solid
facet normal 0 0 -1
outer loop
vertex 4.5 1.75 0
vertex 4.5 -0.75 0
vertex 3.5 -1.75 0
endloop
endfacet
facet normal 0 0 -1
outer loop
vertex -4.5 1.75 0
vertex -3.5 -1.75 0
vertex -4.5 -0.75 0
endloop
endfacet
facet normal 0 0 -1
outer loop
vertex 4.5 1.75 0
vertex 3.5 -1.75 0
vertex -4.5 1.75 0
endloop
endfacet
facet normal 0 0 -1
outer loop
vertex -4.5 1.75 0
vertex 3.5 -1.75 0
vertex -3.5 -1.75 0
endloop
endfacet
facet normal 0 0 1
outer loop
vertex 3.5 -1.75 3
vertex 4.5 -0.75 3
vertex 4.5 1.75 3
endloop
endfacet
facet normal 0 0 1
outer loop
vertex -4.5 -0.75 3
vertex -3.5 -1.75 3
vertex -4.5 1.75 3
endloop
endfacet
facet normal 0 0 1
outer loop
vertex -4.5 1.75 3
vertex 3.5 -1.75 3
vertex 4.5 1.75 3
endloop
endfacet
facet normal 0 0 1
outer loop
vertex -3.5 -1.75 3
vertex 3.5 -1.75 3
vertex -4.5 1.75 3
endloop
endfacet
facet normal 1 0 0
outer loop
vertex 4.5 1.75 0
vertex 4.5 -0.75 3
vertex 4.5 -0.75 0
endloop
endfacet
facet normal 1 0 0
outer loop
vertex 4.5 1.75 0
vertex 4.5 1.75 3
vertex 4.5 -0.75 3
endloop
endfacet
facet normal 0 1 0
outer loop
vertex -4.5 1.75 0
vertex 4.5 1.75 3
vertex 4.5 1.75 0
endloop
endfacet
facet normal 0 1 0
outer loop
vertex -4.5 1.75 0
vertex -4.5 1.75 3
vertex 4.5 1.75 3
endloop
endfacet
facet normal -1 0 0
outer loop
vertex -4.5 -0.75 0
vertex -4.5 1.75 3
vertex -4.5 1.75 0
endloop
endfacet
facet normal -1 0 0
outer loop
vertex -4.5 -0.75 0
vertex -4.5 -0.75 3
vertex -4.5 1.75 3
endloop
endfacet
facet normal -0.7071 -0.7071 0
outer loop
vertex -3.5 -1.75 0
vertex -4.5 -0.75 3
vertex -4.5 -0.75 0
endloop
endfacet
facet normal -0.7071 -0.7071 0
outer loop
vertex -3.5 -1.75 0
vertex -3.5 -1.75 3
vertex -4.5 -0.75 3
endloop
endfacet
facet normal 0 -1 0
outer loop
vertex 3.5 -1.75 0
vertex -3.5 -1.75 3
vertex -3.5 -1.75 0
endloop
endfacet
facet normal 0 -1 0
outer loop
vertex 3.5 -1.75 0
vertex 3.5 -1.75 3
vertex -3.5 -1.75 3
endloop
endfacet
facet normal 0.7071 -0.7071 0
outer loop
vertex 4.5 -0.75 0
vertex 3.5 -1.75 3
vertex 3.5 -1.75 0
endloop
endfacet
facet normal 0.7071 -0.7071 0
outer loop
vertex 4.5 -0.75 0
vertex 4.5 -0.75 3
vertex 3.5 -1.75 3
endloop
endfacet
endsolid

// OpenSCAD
microusb_cutout = [9, 3.5];

microusb_cutout();

module microusb_cutout(depth=3) {
    width=microusb_cutout.x;
    height=microusb_cutout.y;
    
    corner=1;
    
    half_long = width/2-corner;
    half_height = height/2-corner;
    
    linear_extrude(depth) polygon(points=[
        // Upper left corner
        [-half_long-corner, half_height+corner],
        // Upper right corner
        [half_long+corner, half_height+corner],
    
        [half_long+corner, half_height],
        [half_long+corner, -half_height],

        [half_long, -half_height-corner],
        [-half_long, -half_height-corner],

        [-half_long-corner, -half_height],
        [-half_long-corner, half_height],
    ]);
}
